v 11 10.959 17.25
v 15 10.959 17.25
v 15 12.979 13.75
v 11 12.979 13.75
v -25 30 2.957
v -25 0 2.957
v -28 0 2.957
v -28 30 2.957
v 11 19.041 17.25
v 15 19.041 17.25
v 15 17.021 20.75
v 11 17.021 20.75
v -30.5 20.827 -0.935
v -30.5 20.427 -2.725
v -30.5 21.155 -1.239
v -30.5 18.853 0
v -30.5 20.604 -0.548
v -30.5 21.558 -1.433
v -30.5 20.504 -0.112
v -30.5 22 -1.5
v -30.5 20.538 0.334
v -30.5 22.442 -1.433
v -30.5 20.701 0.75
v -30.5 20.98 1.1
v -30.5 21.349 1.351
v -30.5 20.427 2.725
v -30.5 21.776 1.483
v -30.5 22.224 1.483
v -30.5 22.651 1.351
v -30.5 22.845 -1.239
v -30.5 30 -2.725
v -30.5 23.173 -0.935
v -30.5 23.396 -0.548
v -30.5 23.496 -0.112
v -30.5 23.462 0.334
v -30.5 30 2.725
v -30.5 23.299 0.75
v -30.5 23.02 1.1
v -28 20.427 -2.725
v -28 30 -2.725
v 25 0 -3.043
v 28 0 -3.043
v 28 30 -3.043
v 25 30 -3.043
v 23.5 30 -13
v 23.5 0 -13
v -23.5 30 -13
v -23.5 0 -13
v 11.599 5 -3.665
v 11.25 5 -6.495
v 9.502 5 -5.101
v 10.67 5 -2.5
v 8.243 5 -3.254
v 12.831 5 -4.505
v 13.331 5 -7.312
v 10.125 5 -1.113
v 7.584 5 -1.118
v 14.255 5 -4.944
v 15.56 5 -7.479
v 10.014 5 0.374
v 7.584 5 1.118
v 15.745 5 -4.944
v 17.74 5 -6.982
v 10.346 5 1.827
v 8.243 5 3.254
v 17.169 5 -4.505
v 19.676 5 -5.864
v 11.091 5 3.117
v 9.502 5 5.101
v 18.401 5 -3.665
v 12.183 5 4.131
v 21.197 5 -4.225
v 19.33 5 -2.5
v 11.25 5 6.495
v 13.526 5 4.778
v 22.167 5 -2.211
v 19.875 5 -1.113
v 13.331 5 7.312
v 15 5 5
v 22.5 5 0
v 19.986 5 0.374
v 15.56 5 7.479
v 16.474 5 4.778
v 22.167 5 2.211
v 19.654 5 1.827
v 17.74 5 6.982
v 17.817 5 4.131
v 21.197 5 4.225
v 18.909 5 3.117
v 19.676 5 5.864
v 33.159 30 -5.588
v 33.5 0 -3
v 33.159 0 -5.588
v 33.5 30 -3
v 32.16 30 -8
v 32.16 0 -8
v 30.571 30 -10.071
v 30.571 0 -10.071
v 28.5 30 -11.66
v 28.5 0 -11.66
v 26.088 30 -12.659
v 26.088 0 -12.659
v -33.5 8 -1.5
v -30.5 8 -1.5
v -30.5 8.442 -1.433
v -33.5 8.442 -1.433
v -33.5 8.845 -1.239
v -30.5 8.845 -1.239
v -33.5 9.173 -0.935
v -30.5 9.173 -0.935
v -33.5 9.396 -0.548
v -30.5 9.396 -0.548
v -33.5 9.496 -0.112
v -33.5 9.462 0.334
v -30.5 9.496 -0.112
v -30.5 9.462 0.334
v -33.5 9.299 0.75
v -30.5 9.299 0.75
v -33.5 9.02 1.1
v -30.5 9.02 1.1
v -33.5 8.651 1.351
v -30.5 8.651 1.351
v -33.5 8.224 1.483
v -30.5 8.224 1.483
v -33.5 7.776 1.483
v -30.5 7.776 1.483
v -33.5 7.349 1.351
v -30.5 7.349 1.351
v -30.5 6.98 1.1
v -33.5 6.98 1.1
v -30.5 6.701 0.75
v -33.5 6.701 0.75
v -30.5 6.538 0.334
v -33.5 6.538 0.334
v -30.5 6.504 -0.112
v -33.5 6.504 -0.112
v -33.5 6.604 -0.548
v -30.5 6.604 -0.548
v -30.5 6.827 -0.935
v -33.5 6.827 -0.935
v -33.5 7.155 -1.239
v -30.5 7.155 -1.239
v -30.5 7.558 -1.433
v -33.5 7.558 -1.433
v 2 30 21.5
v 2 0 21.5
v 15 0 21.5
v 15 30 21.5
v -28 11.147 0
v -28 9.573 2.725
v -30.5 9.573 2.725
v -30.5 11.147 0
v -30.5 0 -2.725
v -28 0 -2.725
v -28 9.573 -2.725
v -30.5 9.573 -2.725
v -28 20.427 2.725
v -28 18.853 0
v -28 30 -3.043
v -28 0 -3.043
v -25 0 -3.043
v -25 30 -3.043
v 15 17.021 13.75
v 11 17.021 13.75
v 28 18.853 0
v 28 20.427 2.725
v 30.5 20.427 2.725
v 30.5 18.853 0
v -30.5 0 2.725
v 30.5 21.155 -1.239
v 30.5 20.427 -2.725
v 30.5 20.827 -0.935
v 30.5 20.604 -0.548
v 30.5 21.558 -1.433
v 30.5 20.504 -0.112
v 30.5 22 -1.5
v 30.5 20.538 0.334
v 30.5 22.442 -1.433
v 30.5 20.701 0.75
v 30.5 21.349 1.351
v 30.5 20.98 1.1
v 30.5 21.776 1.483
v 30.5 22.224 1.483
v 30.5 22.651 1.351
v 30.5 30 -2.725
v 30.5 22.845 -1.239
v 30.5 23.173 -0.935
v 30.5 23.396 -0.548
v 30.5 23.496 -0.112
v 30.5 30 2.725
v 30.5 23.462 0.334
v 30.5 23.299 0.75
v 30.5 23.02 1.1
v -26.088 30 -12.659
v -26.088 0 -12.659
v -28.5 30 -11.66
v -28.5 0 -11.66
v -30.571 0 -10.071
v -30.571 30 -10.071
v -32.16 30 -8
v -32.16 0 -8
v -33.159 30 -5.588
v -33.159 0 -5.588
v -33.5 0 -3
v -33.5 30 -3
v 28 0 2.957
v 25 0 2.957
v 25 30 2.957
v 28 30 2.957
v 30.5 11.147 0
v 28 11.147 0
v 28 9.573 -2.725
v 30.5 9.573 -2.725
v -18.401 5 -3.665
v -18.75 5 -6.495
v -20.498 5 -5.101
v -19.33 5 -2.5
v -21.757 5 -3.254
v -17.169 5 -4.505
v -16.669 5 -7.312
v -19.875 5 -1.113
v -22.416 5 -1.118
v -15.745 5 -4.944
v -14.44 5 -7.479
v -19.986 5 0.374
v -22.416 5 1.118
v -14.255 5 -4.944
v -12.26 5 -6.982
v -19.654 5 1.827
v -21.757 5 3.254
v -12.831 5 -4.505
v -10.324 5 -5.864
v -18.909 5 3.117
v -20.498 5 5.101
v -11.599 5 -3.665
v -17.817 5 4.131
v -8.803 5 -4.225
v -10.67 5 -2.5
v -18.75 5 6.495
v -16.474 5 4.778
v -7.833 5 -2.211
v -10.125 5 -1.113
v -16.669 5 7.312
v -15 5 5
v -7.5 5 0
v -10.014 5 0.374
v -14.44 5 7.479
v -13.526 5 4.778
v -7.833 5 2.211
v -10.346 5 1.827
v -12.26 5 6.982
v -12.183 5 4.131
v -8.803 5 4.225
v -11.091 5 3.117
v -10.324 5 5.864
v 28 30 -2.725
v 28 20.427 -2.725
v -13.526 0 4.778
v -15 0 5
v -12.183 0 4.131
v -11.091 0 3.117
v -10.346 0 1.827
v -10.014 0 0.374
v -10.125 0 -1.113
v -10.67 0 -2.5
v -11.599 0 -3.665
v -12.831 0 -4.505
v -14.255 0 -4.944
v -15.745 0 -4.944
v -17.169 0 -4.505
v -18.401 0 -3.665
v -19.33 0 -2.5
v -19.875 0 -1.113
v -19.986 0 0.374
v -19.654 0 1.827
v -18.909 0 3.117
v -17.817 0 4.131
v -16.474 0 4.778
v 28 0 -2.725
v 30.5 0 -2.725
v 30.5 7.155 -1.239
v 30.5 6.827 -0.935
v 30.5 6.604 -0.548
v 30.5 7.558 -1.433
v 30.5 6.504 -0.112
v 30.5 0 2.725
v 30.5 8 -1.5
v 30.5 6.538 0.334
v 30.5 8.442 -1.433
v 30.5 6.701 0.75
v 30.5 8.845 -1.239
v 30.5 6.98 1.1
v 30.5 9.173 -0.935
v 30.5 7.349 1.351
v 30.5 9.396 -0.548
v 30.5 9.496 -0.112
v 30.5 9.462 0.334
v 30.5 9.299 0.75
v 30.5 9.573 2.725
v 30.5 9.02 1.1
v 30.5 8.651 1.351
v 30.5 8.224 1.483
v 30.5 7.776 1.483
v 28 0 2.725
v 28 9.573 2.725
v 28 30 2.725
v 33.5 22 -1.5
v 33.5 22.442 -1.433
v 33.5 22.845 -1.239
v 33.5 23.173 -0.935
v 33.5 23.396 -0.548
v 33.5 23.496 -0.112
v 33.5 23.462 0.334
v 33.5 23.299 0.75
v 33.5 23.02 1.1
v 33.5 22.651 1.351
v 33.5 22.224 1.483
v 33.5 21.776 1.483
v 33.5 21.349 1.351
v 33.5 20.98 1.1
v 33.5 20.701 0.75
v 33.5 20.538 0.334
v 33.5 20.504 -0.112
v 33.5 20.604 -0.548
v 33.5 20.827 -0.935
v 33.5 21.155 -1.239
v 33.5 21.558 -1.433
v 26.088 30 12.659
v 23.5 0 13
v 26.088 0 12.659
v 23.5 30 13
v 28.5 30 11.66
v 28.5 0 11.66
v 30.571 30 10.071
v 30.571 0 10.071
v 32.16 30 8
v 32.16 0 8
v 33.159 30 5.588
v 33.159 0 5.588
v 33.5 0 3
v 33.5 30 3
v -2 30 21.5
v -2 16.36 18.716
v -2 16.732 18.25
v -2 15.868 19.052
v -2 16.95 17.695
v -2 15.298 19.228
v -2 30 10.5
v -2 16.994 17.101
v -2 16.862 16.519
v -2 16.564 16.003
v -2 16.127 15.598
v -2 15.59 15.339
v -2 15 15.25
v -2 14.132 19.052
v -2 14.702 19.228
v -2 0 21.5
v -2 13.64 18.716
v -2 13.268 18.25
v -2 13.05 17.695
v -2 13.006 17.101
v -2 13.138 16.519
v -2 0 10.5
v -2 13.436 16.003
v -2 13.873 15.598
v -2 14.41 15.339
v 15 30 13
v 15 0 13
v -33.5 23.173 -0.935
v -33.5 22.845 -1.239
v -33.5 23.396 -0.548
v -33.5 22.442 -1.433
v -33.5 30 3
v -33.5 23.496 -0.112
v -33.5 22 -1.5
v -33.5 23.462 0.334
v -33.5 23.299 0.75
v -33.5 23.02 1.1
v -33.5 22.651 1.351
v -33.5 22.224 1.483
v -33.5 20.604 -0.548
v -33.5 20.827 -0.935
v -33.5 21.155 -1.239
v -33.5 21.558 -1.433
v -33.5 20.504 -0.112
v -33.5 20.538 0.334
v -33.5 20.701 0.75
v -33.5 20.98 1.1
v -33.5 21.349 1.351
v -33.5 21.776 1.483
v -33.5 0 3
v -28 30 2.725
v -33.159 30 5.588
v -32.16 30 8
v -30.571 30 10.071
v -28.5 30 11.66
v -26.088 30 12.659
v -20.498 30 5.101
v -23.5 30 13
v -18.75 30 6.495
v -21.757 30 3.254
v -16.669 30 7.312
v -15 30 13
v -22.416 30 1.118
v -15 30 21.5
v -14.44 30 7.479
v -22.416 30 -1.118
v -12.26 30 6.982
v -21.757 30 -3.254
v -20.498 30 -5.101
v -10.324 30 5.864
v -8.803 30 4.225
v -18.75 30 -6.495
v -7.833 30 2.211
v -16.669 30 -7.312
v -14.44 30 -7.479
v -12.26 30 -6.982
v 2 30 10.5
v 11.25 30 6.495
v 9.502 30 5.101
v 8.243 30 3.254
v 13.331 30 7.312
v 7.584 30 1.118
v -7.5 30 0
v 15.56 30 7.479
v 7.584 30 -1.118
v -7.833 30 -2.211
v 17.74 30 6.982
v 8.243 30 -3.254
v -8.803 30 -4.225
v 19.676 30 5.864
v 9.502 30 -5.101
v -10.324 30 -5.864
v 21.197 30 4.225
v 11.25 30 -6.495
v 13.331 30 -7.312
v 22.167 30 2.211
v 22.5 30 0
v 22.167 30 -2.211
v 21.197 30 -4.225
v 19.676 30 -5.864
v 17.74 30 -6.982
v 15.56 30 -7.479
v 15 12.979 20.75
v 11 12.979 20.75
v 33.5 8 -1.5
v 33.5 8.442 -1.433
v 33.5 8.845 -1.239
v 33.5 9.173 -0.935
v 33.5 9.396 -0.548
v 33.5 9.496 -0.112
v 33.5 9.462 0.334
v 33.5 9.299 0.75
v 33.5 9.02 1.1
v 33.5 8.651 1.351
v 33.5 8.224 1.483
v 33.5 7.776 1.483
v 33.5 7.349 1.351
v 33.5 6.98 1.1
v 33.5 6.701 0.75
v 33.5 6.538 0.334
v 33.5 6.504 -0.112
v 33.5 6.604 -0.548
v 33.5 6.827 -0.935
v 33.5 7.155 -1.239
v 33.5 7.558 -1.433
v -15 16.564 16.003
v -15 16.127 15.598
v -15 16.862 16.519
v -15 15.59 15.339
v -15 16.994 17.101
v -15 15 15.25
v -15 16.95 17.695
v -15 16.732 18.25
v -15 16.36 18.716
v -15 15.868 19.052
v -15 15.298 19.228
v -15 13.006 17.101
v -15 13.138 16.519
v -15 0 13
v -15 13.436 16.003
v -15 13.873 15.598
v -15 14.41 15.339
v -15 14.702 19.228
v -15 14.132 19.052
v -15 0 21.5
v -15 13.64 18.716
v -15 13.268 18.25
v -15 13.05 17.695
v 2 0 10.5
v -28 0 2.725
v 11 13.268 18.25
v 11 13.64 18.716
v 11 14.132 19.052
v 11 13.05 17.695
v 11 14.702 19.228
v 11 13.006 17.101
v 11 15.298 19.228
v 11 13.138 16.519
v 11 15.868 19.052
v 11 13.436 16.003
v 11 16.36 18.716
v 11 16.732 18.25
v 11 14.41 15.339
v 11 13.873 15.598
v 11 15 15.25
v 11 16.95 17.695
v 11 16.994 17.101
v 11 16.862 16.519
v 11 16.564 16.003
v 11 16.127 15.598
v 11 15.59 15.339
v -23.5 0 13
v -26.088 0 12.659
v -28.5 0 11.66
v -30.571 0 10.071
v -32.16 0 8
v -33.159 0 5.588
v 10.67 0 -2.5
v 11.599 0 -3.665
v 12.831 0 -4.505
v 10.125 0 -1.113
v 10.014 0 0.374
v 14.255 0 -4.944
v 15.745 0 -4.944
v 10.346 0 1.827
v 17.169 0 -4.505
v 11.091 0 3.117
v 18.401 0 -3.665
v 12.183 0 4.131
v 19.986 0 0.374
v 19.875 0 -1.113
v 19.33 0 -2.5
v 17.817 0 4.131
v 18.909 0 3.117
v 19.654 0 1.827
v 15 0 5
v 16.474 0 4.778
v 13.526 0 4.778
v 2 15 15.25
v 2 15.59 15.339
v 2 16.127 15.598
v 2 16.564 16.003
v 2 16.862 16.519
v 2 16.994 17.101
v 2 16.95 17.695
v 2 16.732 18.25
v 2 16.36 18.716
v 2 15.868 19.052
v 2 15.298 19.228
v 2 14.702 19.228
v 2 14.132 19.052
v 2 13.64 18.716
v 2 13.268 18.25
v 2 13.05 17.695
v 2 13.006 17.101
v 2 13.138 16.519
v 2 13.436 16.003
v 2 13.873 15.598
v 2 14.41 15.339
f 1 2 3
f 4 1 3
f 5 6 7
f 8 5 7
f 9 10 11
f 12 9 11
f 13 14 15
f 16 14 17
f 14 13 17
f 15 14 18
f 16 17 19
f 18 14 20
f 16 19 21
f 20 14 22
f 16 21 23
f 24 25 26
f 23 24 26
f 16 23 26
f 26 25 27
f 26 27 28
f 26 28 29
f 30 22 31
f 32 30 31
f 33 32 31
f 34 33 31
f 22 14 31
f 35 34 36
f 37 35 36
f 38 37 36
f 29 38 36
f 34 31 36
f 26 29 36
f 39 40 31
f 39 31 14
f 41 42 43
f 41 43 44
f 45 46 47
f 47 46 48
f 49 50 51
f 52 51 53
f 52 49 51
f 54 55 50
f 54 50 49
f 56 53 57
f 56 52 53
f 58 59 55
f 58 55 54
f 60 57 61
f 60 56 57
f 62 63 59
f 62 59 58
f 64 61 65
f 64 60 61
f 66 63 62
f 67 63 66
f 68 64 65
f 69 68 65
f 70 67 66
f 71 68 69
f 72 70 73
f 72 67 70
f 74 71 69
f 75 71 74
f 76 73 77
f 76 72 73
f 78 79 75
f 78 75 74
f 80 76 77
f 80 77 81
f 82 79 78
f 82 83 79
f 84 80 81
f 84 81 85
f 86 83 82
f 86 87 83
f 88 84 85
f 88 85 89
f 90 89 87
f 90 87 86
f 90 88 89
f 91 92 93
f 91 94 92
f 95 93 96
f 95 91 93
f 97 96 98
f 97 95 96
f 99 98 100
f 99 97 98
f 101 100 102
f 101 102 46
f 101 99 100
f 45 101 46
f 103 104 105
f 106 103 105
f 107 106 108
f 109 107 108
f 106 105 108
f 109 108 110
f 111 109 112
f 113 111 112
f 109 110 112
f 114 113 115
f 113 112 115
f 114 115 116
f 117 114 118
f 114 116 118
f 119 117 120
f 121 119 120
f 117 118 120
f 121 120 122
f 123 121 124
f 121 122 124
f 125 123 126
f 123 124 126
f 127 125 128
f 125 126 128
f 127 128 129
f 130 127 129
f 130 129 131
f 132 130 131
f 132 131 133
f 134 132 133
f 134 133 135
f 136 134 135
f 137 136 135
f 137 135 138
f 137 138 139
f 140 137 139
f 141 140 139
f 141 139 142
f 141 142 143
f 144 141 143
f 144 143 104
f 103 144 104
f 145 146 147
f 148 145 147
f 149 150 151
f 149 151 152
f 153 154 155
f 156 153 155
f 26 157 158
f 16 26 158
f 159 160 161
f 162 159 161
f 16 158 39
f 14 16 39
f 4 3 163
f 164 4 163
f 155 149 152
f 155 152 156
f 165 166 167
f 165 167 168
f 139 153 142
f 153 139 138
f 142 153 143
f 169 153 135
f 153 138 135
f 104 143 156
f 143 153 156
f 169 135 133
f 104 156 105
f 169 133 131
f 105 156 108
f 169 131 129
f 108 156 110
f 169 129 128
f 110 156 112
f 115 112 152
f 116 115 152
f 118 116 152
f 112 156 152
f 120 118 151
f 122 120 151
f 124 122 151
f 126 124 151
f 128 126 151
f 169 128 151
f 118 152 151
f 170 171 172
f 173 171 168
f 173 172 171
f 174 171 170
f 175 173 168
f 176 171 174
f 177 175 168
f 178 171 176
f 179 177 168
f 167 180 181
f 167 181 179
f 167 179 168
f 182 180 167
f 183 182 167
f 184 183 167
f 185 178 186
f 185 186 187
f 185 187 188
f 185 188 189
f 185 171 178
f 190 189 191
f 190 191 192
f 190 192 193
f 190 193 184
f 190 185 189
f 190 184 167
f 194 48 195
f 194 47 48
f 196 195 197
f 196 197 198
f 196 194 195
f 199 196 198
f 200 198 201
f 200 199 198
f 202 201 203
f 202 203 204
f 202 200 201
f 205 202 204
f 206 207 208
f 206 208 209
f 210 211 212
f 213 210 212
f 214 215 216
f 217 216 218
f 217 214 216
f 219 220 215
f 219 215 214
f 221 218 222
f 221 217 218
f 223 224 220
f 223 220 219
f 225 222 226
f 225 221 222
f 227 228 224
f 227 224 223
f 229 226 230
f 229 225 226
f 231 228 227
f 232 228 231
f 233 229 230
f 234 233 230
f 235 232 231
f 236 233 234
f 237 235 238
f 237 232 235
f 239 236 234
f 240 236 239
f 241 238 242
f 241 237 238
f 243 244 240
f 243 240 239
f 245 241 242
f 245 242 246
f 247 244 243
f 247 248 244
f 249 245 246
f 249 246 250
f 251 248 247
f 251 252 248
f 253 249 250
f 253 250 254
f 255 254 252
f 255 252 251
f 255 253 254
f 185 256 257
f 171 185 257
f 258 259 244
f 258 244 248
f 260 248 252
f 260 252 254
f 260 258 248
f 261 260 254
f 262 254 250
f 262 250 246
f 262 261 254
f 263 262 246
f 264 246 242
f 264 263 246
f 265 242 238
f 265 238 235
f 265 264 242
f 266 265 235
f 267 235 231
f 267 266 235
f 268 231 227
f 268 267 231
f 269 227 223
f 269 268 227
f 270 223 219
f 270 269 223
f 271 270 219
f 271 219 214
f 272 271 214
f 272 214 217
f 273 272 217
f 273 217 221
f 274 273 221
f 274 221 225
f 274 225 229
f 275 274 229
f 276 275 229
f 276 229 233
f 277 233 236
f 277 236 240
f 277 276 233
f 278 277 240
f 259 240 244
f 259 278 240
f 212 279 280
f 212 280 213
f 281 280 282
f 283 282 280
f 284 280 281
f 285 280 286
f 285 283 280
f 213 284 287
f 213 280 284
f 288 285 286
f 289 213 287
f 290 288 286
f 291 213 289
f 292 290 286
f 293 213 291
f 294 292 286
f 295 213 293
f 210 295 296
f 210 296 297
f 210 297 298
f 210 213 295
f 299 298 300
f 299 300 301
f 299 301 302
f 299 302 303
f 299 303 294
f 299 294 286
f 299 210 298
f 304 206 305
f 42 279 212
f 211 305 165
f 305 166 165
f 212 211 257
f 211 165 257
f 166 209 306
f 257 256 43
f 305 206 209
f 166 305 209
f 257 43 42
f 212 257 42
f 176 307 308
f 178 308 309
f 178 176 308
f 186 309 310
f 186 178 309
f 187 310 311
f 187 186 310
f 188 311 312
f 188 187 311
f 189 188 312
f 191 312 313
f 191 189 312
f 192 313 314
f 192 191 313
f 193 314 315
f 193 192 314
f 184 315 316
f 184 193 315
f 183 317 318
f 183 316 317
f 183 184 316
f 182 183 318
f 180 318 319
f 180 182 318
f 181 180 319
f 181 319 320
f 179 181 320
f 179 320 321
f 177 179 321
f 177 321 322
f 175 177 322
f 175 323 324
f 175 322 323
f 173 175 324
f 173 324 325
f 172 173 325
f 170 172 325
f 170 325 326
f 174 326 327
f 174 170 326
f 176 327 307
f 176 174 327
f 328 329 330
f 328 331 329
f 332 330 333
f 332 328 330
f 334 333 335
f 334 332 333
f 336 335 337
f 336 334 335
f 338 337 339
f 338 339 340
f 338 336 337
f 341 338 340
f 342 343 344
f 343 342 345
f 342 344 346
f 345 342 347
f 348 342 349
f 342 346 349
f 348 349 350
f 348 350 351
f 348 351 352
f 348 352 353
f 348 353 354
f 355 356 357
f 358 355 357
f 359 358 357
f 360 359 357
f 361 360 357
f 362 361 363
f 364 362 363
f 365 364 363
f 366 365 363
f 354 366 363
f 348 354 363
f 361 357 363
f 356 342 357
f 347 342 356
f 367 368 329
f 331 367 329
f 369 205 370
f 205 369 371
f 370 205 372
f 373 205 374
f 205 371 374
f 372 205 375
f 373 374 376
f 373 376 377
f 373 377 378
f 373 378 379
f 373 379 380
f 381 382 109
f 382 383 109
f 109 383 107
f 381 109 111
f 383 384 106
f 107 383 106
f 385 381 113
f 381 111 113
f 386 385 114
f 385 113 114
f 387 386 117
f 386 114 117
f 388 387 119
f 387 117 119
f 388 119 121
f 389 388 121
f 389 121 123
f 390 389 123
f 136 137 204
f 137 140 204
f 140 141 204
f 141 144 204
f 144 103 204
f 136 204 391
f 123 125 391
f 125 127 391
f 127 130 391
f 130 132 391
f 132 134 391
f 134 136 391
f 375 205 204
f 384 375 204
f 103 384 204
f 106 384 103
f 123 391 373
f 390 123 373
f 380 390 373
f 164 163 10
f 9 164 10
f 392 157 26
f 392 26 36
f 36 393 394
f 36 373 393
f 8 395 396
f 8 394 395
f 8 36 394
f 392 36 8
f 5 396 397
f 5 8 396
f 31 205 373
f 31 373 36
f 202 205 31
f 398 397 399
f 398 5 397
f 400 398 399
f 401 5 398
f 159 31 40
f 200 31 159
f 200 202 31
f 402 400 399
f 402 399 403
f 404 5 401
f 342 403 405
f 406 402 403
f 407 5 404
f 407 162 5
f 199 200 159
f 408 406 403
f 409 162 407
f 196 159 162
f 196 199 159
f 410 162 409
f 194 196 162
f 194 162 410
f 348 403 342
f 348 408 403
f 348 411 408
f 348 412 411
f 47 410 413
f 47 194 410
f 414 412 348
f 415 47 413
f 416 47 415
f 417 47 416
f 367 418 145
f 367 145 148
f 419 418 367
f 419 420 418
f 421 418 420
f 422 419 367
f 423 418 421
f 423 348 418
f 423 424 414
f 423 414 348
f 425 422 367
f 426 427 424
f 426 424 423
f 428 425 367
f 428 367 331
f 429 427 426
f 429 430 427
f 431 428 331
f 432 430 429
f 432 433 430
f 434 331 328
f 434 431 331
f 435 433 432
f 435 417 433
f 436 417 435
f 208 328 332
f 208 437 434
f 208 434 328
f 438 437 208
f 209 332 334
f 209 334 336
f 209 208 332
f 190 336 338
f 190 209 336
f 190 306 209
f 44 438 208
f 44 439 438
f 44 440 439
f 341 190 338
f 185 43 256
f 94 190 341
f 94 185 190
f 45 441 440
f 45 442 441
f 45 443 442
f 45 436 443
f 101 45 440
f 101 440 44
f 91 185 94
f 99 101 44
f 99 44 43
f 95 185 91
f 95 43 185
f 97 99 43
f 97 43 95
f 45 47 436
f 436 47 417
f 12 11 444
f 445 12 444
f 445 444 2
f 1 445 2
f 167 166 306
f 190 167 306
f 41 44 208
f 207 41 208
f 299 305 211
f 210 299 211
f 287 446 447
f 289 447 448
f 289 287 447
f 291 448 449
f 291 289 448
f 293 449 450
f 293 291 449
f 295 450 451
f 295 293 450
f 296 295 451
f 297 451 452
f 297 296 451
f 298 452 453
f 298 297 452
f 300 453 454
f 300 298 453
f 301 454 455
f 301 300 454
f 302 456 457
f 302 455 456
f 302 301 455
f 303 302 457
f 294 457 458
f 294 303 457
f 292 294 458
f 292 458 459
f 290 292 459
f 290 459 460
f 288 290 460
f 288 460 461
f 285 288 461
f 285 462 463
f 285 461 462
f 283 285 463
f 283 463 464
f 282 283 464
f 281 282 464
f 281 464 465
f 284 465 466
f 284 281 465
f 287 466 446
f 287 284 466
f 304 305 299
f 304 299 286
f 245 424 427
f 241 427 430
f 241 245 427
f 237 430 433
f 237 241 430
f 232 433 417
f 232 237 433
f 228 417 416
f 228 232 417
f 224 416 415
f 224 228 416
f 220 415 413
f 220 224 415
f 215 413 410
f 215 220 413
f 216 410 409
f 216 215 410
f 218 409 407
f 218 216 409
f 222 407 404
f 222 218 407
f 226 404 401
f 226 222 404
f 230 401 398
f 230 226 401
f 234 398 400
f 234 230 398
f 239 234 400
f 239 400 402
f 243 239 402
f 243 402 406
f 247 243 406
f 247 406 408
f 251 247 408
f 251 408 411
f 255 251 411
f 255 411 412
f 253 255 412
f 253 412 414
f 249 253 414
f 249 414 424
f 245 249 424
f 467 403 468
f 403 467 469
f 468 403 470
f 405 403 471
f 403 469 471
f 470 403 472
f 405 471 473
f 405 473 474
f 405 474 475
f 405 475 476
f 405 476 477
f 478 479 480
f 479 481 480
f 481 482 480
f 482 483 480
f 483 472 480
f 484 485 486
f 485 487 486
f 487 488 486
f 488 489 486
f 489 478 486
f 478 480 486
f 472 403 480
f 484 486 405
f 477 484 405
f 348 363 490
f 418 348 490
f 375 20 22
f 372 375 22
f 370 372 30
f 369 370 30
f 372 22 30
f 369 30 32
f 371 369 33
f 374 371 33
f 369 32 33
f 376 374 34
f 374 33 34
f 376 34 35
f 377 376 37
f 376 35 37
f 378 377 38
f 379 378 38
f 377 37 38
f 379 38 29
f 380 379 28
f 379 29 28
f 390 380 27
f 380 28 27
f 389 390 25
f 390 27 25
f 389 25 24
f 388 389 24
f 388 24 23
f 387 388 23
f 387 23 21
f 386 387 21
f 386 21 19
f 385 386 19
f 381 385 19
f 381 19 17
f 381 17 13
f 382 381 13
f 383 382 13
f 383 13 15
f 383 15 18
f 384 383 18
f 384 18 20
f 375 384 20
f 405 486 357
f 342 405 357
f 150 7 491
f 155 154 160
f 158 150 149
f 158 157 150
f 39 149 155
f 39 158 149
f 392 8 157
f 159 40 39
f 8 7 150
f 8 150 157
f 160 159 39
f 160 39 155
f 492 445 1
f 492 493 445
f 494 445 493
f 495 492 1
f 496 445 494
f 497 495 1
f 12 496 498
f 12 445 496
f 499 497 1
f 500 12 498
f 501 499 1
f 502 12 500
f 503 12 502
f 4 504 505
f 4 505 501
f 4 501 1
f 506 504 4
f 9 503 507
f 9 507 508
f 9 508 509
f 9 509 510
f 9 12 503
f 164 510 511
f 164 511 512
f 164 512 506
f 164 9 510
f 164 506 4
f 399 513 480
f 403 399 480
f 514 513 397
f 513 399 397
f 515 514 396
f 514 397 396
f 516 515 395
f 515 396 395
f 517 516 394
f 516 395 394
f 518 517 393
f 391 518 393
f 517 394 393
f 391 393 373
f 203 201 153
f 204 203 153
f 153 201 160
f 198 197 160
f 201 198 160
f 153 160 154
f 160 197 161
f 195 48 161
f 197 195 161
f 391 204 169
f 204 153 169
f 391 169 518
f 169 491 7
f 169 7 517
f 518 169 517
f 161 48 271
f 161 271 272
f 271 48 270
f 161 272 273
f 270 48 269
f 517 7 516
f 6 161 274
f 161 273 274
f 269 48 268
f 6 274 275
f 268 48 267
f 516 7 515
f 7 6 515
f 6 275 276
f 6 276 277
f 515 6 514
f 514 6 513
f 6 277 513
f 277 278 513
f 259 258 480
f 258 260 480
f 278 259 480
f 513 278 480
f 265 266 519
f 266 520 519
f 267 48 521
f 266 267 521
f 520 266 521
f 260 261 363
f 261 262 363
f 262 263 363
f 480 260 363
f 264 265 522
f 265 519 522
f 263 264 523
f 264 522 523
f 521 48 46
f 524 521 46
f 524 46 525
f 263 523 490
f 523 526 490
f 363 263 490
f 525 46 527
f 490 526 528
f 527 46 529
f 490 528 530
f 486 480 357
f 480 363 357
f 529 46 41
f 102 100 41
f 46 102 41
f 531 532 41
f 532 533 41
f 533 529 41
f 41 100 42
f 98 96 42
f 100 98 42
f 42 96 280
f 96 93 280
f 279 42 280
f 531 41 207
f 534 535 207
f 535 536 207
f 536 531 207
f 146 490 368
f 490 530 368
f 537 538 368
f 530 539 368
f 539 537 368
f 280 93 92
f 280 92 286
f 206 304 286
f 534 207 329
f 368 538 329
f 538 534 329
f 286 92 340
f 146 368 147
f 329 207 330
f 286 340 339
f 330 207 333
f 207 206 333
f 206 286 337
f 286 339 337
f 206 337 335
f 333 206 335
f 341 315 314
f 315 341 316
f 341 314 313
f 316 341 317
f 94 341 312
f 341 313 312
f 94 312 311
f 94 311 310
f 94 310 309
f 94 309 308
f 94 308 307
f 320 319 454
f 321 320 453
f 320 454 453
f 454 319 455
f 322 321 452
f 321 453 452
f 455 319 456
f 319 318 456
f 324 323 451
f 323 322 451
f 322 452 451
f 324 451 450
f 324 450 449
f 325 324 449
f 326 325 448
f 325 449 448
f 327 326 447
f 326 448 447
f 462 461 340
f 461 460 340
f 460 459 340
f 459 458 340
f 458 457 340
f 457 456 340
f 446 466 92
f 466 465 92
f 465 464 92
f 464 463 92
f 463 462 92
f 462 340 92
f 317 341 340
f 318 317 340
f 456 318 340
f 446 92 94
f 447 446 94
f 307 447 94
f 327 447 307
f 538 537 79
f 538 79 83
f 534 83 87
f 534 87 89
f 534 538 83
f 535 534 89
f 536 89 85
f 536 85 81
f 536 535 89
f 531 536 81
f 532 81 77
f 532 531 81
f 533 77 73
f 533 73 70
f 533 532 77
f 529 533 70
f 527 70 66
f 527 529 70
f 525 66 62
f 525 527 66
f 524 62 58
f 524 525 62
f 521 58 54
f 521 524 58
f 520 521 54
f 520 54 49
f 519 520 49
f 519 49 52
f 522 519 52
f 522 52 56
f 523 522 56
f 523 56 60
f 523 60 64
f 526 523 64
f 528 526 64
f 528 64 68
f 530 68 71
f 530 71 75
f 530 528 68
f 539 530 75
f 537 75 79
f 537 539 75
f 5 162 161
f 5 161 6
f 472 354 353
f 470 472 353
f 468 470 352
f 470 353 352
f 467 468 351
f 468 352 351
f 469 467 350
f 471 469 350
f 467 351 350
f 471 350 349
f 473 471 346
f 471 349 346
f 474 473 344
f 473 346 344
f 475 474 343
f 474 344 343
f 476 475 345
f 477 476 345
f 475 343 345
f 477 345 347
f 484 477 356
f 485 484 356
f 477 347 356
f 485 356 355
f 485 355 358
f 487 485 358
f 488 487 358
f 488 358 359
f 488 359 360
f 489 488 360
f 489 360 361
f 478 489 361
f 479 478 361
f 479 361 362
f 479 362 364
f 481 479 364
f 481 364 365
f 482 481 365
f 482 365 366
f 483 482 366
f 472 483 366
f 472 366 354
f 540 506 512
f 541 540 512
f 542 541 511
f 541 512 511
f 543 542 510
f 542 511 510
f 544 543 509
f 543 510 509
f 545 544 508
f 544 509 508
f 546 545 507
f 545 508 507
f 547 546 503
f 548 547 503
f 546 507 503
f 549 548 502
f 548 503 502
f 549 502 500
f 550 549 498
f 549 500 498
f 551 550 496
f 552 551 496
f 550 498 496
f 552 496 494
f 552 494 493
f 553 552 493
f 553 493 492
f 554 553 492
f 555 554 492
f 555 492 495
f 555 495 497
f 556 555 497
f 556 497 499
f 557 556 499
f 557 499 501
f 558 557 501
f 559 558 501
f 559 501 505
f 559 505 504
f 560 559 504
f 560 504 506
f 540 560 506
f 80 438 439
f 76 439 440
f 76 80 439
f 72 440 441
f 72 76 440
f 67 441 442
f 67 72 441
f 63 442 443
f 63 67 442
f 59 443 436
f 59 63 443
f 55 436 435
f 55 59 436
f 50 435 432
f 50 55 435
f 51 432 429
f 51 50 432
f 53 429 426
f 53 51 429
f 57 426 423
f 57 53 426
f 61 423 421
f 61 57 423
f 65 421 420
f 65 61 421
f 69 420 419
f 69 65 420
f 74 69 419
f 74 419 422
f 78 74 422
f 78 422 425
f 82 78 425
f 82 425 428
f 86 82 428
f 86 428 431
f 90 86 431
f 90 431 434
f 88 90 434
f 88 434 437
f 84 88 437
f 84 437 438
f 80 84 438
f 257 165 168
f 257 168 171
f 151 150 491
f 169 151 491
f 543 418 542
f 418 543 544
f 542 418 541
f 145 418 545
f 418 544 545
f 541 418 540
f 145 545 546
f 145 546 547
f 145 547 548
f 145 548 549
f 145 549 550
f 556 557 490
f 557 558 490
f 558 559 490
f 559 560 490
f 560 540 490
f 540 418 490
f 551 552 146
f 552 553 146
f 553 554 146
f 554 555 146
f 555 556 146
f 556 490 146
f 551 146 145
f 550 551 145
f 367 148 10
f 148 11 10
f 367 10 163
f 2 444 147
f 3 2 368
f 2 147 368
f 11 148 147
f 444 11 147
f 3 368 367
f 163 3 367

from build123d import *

# Parameters (mm, degrees)
BOSS_EXTRUDE1_OUTLINE_R = 7.5
BOSS_EXTRUDE1_DEPTH     = 30
SKETCH1_3_R             = 7.5
SKETCH1_3_R_2           = 5
BOSS_EXTRUDE2_DEPTH     = 5
FILLET1_R               = 10
CUT_EXTRUDE6_DEPTH      = 4
SKETCH5_3_R             = 2
CUT_EXTRUDE7_DEPTH      = 35
SKETCH10_R              = 1.5
CUT_EXTRUDE11_DEPTH     = 4
CUT_EXTRUDE12_START     = -2.5
SKETCH10_5_R            = 1.5
CUT_EXTRUDE12_DEPTH     = 2.5
CUT_EXTRUDE13_DEPTH     = 34


# Read off the part's stored shape, not the designer's step: Boss-Extrude1
with BuildPart() as part:
    # Boss-Extrude1 outline → Boss-Extrude1 (new body)
    with BuildSketch(Plane(origin=(0, 0, 0), x_dir=(1, 0, 0), z_dir=(0, 1, 0))):
        Polygon((-33.5, 13), (-33.5, -13), (-15, -13), (-15, -21.5), (-2, -21.5), (-2, -10.5), (2, -10.5), (2, -21.5), (15, -21.5), (15, -13), (33.5, -13), (33.5, 13), align=None)
        with Locations((-15, 0)):
            Circle(BOSS_EXTRUDE1_OUTLINE_R, mode=Mode.SUBTRACT)
        with Locations((15, 0)):
            Circle(BOSS_EXTRUDE1_OUTLINE_R, mode=Mode.SUBTRACT)
    extrude(amount=BOSS_EXTRUDE1_DEPTH)

    # Sketch1<3> → Boss-Extrude2 (add)
    # profile 1 of 2: a face of its own
    with BuildSketch(Plane(origin=(0, 0, 0), x_dir=(1, 0, 0), z_dir=(0, 1, 0))):
        with Locations(Location((-15, 0, 0), (0, 0, 270))):
            Circle(SKETCH1_3_R)
        with Locations(Location((-15, 0, 0), (0, 0, 270))):
            Circle(SKETCH1_3_R_2, mode=Mode.SUBTRACT)
    # profile 2 of 2: a face of its own
    with BuildSketch(Plane(origin=(0, 0, 0), x_dir=(1, 0, 0), z_dir=(0, 1, 0))):
        with Locations(Location((15, 0, 0), (0, 0, 270))):
            Circle(SKETCH1_3_R)
        with Locations(Location((15, 0, 0), (0, 0, 270))):
            Circle(SKETCH1_3_R_2, mode=Mode.SUBTRACT)
    extrude(amount=BOSS_EXTRUDE2_DEPTH)

    # Fillet1
    fillet1_edges = [part.edges().sort_by_distance(p)[0] for p in [
        (-33.5, 15, -13),
        (33.5, 15, -13),
        (33.5, 15, 13),
        (-33.5, 15, 13),
    ]]
    fillet(fillet1_edges, radius=FILLET1_R)

    # Sketch5 → Cut-Extrude6 (cut)
    with BuildSketch(Plane(origin=(15, 0, 0), x_dir=(0, 0, -1), z_dir=(1, 0, 0))):
        with BuildLine():
            Line((-20.75, 17.020725942), (-20.75, 15))
            Line((-20.75, 15), (-19.25, 15))
            ThreePointArc((-19.25, 15), (-17.25, 17), (-15.25, 15))
            Line((-15.25, 15), (-13.75, 15))
            Line((-13.75, 15), (-13.75, 17.020725942))
            Line((-13.75, 17.020725942), (-17.25, 19.041451884))
            Line((-17.25, 19.041451884), (-20.75, 17.020725942))
        make_face()
        with BuildLine():
            Line((-19.25, 15), (-20.75, 15))
            Line((-20.75, 15), (-20.75, 12.979274058))
            Line((-20.75, 12.979274058), (-17.25, 10.958548116))
            Line((-17.25, 10.958548116), (-13.75, 12.979274058))
            Line((-13.75, 12.979274058), (-13.75, 15))
            Line((-13.75, 15), (-15.25, 15))
            ThreePointArc((-15.25, 15), (-17.25, 13), (-19.25, 15))
        make_face()
    extrude(amount=-CUT_EXTRUDE6_DEPTH, mode=Mode.SUBTRACT)

    # Sketch5<3> → Cut-Extrude7 (cut)
    with BuildSketch(Plane(origin=(15, 0, 0), x_dir=(0, 0, -1), z_dir=(1, 0, 0))):
        with Locations((-17.25, 15)):
            Circle(SKETCH5_3_R)
    extrude(amount=-CUT_EXTRUDE7_DEPTH, mode=Mode.SUBTRACT)

    # Sketch10 → Cut-Extrude11 (cut)
    with BuildSketch(Plane(origin=(30.5, 0, 0), x_dir=(0, 0, -1), z_dir=(1, 0, 0))):
        with Locations((0, 22)):
            Circle(SKETCH10_R)
        with Locations((0, 8)):
            Circle(SKETCH10_R)
    cut_extrude11 = extrude(amount=CUT_EXTRUDE11_DEPTH, mode=Mode.SUBTRACT)

    # Sketch10<5> → Cut-Extrude12 (cut)
    # profile 1 of 5: a face of its own
    with BuildSketch(Plane(origin=(30.5, 0, 0), x_dir=(0, 0, -1), z_dir=(1, 0, 0)).offset(CUT_EXTRUDE12_START)):
        Polygon((-2.725, 30), (2.725, 30), (2.725, 23.573279484), (0, 25.146558967), (-2.725, 23.573279484), align=None)
    # profile 2 of 5: a face of its own
    with BuildSketch(Plane(origin=(30.5, 0, 0), x_dir=(0, 0, -1), z_dir=(1, 0, 0)).offset(CUT_EXTRUDE12_START)):
        Polygon((2.725, 20.426720516), (2.725, 23.573279484), (0, 25.146558967), (-2.725, 23.573279484), (-2.725, 20.426720516), (0, 18.853441033), align=None)
        with Locations((0, 22)):
            Circle(SKETCH10_5_R, mode=Mode.SUBTRACT)
    # profile 3 of 5: a face of its own
    with BuildSketch(Plane(origin=(30.5, 0, 0), x_dir=(0, 0, -1), z_dir=(1, 0, 0)).offset(CUT_EXTRUDE12_START)):
        with Locations((0, 22)):
            Circle(SKETCH10_5_R)
    # profile 4 of 5: a face of its own
    with BuildSketch(Plane(origin=(30.5, 0, 0), x_dir=(0, 0, -1), z_dir=(1, 0, 0)).offset(CUT_EXTRUDE12_START)):
        Polygon((-2.725, 6.426720516), (-2.725, 9.573279484), (0, 11.146558967), (2.725, 9.573279484), (2.725, 6.426720516), (2.725, 0), (-2.725, 0), align=None)
        with Locations((0, 8)):
            Circle(SKETCH10_5_R, mode=Mode.SUBTRACT)
    # profile 5 of 5: a face of its own
    with BuildSketch(Plane(origin=(30.5, 0, 0), x_dir=(0, 0, -1), z_dir=(1, 0, 0)).offset(CUT_EXTRUDE12_START)):
        with Locations((0, 8)):
            Circle(SKETCH10_5_R)
    cut_extrude12 = extrude(amount=CUT_EXTRUDE12_DEPTH, mode=Mode.SUBTRACT)

    # Sketch11 → Cut-Extrude13 (cut)
    with BuildSketch(Plane(origin=(0, 30, 0), x_dir=(1, 0, 0), z_dir=(0, 1, 0))):
        Polygon((28, 2.725), (28, 3.043492212), (25, 3.043492212), (25, -2.956507788), (28, -2.956507788), (28, -2.638015576), align=None)
    cut_extrude13 = extrude(amount=-CUT_EXTRUDE13_DEPTH, mode=Mode.SUBTRACT)

    # Mirror1: Cut-Extrude11, Cut-Extrude12, Cut-Extrude13 across plane
    add(cut_extrude11.mirror(Plane(origin=(0, 0, 0), x_dir=(0, 0, 1), z_dir=(1, 0, 0))), mode=Mode.SUBTRACT)
    add(cut_extrude12.mirror(Plane(origin=(0, 0, 0), x_dir=(0, 0, 1), z_dir=(1, 0, 0))), mode=Mode.SUBTRACT)
    add(cut_extrude13.mirror(Plane(origin=(0, 0, 0), x_dir=(0, 0, 1), z_dir=(1, 0, 0))), mode=Mode.SUBTRACT)


solid = part.part
